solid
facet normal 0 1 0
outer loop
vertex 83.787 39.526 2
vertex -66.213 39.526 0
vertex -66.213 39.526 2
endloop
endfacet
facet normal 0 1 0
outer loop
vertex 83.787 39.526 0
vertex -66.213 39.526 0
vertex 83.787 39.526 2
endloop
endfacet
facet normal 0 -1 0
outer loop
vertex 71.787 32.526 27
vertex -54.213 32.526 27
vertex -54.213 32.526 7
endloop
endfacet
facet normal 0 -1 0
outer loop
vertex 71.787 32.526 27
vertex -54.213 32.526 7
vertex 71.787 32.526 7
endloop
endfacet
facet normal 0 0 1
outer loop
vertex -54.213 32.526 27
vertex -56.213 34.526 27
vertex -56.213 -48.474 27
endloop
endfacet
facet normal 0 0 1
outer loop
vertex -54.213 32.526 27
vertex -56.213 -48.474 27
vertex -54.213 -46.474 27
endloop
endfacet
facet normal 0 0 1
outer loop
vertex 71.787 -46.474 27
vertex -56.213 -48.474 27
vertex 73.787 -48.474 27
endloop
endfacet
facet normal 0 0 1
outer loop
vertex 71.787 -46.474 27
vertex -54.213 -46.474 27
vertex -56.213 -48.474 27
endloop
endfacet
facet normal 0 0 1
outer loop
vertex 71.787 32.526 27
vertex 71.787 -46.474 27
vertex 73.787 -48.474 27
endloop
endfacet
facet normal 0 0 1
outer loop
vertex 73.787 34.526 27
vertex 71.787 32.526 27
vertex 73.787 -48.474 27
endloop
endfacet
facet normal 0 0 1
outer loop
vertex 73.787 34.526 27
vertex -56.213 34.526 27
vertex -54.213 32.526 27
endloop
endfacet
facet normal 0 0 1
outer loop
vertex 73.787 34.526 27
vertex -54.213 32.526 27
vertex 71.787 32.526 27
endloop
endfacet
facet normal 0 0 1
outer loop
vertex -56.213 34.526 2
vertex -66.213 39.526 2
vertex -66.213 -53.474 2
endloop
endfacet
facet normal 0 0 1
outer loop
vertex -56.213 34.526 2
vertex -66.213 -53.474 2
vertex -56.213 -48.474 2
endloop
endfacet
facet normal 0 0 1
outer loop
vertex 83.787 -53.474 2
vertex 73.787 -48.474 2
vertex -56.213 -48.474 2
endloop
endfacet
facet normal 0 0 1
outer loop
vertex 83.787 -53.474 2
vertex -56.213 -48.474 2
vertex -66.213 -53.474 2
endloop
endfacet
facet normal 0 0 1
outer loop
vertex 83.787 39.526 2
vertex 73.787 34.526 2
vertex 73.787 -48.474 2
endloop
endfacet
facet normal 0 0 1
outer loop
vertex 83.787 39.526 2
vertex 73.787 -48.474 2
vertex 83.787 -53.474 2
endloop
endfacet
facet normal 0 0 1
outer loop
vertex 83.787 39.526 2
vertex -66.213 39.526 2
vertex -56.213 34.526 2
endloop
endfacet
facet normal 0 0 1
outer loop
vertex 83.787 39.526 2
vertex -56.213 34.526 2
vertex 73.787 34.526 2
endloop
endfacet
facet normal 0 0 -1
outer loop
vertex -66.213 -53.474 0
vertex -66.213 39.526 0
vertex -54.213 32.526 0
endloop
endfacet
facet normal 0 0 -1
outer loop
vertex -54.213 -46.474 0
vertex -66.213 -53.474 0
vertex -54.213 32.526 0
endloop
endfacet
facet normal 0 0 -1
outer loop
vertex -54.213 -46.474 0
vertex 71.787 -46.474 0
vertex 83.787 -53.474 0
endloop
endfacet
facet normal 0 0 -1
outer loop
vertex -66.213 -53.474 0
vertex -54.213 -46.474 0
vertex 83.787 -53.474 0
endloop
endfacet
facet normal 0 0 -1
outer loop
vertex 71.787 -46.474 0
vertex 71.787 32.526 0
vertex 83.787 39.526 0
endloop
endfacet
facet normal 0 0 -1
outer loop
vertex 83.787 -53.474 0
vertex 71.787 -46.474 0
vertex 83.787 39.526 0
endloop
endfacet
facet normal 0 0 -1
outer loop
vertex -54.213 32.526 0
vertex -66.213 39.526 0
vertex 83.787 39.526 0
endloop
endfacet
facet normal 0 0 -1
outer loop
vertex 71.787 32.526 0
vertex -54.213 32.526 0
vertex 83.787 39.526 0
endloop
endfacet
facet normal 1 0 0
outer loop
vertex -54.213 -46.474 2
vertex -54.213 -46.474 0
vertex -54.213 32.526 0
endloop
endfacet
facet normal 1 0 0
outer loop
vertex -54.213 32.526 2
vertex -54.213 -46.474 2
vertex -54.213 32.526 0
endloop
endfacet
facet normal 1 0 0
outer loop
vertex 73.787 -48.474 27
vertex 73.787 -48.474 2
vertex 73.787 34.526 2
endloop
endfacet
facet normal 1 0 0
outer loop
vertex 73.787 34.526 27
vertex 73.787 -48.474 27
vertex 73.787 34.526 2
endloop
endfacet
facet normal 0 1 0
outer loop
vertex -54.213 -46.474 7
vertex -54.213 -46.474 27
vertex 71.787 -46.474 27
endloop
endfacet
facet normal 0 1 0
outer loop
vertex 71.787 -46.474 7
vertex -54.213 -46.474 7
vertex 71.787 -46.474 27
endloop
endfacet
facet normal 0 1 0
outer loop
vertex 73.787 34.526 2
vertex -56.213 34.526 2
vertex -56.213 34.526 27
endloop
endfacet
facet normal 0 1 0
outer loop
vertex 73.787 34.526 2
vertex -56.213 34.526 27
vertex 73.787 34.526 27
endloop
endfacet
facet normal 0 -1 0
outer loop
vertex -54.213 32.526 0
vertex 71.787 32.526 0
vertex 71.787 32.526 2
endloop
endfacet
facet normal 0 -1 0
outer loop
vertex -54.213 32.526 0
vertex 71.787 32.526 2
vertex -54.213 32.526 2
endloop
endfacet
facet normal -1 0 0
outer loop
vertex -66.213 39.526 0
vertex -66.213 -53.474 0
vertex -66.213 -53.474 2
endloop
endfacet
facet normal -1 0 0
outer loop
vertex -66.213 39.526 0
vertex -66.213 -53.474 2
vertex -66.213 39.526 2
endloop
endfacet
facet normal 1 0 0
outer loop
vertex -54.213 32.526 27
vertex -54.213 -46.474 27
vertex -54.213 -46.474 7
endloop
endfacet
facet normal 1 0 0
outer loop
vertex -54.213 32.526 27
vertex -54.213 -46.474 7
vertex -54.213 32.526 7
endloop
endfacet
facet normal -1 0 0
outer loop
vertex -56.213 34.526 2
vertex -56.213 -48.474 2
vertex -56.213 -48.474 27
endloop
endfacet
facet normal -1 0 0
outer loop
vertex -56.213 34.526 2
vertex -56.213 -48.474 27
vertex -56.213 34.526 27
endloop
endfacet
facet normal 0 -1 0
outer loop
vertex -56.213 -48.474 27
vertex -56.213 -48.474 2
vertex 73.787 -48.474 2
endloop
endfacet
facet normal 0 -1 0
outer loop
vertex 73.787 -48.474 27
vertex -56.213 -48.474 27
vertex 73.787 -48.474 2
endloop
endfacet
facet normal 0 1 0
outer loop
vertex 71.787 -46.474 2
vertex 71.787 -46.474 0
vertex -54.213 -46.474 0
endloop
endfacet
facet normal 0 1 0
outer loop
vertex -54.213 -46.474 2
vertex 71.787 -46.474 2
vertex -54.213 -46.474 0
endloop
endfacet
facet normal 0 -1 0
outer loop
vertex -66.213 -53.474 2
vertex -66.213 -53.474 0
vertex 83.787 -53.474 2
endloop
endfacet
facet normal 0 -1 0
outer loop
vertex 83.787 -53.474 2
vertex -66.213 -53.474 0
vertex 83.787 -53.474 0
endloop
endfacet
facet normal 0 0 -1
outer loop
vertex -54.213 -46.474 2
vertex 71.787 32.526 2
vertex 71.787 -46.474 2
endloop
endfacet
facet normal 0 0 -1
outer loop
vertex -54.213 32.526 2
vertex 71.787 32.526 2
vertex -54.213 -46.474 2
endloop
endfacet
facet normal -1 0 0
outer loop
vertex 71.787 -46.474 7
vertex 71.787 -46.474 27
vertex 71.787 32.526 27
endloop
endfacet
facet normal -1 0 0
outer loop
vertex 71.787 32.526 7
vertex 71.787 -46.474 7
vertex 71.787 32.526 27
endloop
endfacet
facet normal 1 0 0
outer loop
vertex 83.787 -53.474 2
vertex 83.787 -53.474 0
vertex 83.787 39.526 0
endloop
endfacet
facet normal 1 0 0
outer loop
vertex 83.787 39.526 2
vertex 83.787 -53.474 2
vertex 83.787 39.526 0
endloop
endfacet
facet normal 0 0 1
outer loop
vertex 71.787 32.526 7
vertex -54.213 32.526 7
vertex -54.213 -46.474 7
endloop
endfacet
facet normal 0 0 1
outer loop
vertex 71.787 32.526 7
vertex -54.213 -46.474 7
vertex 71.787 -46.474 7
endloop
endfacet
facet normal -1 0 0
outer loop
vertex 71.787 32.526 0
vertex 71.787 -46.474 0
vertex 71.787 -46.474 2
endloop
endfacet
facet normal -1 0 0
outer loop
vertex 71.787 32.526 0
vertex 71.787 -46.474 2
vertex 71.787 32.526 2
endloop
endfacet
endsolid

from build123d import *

# Parameters (mm, degrees)
SKETCH_1_W          = 150
SKETCH_1_H          = 93
EXTRUDE_2_DEPTH     = 2
SKETCH_2_W          = 130
SKETCH_2_H          = 83
EXTRUDE_3_DEPTH     = 25
SKETCH_3_W          = 126
SKETCH_3_H          = 79
CUT_EXTRUDE_1_DEPTH = 2
SKETCH_4_W          = 126
SKETCH_4_H          = 79
CUT_EXTRUDE_2_DEPTH = 20


with BuildPart() as part:
    # 草图1 → 凸台-拉伸2 (new body)
    with BuildSketch(Plane.XY):
        with Locations((8.786617008, -6.973744962)):
            Rectangle(SKETCH_1_W, SKETCH_1_H)
    extrude(amount=EXTRUDE_2_DEPTH)

    # 草图2 → 凸台-拉伸3 (add)
    with BuildSketch(Plane.XY.offset(2)):
        with Locations((8.786617008, -6.973744962)):
            Rectangle(SKETCH_2_W, SKETCH_2_H)
    extrude(amount=EXTRUDE_3_DEPTH)

    # 草图3 → 切除-拉伸1 (cut)
    with BuildSketch(Plane(origin=(0, 0, 0), x_dir=(-1, 0, 0), z_dir=(0, 0, -1))):
        with Locations((-8.786617008, -6.973744962)):
            Rectangle(SKETCH_3_W, SKETCH_3_H)
    extrude(amount=-CUT_EXTRUDE_1_DEPTH, mode=Mode.SUBTRACT)

    # 草图4 → 切除-拉伸2 (cut)
    with BuildSketch(Plane.XY.offset(27)):
        with Locations((8.786617008, -6.973744962)):
            Rectangle(SKETCH_4_W, SKETCH_4_H)
    extrude(amount=-CUT_EXTRUDE_2_DEPTH, mode=Mode.SUBTRACT)


solid = part.part
